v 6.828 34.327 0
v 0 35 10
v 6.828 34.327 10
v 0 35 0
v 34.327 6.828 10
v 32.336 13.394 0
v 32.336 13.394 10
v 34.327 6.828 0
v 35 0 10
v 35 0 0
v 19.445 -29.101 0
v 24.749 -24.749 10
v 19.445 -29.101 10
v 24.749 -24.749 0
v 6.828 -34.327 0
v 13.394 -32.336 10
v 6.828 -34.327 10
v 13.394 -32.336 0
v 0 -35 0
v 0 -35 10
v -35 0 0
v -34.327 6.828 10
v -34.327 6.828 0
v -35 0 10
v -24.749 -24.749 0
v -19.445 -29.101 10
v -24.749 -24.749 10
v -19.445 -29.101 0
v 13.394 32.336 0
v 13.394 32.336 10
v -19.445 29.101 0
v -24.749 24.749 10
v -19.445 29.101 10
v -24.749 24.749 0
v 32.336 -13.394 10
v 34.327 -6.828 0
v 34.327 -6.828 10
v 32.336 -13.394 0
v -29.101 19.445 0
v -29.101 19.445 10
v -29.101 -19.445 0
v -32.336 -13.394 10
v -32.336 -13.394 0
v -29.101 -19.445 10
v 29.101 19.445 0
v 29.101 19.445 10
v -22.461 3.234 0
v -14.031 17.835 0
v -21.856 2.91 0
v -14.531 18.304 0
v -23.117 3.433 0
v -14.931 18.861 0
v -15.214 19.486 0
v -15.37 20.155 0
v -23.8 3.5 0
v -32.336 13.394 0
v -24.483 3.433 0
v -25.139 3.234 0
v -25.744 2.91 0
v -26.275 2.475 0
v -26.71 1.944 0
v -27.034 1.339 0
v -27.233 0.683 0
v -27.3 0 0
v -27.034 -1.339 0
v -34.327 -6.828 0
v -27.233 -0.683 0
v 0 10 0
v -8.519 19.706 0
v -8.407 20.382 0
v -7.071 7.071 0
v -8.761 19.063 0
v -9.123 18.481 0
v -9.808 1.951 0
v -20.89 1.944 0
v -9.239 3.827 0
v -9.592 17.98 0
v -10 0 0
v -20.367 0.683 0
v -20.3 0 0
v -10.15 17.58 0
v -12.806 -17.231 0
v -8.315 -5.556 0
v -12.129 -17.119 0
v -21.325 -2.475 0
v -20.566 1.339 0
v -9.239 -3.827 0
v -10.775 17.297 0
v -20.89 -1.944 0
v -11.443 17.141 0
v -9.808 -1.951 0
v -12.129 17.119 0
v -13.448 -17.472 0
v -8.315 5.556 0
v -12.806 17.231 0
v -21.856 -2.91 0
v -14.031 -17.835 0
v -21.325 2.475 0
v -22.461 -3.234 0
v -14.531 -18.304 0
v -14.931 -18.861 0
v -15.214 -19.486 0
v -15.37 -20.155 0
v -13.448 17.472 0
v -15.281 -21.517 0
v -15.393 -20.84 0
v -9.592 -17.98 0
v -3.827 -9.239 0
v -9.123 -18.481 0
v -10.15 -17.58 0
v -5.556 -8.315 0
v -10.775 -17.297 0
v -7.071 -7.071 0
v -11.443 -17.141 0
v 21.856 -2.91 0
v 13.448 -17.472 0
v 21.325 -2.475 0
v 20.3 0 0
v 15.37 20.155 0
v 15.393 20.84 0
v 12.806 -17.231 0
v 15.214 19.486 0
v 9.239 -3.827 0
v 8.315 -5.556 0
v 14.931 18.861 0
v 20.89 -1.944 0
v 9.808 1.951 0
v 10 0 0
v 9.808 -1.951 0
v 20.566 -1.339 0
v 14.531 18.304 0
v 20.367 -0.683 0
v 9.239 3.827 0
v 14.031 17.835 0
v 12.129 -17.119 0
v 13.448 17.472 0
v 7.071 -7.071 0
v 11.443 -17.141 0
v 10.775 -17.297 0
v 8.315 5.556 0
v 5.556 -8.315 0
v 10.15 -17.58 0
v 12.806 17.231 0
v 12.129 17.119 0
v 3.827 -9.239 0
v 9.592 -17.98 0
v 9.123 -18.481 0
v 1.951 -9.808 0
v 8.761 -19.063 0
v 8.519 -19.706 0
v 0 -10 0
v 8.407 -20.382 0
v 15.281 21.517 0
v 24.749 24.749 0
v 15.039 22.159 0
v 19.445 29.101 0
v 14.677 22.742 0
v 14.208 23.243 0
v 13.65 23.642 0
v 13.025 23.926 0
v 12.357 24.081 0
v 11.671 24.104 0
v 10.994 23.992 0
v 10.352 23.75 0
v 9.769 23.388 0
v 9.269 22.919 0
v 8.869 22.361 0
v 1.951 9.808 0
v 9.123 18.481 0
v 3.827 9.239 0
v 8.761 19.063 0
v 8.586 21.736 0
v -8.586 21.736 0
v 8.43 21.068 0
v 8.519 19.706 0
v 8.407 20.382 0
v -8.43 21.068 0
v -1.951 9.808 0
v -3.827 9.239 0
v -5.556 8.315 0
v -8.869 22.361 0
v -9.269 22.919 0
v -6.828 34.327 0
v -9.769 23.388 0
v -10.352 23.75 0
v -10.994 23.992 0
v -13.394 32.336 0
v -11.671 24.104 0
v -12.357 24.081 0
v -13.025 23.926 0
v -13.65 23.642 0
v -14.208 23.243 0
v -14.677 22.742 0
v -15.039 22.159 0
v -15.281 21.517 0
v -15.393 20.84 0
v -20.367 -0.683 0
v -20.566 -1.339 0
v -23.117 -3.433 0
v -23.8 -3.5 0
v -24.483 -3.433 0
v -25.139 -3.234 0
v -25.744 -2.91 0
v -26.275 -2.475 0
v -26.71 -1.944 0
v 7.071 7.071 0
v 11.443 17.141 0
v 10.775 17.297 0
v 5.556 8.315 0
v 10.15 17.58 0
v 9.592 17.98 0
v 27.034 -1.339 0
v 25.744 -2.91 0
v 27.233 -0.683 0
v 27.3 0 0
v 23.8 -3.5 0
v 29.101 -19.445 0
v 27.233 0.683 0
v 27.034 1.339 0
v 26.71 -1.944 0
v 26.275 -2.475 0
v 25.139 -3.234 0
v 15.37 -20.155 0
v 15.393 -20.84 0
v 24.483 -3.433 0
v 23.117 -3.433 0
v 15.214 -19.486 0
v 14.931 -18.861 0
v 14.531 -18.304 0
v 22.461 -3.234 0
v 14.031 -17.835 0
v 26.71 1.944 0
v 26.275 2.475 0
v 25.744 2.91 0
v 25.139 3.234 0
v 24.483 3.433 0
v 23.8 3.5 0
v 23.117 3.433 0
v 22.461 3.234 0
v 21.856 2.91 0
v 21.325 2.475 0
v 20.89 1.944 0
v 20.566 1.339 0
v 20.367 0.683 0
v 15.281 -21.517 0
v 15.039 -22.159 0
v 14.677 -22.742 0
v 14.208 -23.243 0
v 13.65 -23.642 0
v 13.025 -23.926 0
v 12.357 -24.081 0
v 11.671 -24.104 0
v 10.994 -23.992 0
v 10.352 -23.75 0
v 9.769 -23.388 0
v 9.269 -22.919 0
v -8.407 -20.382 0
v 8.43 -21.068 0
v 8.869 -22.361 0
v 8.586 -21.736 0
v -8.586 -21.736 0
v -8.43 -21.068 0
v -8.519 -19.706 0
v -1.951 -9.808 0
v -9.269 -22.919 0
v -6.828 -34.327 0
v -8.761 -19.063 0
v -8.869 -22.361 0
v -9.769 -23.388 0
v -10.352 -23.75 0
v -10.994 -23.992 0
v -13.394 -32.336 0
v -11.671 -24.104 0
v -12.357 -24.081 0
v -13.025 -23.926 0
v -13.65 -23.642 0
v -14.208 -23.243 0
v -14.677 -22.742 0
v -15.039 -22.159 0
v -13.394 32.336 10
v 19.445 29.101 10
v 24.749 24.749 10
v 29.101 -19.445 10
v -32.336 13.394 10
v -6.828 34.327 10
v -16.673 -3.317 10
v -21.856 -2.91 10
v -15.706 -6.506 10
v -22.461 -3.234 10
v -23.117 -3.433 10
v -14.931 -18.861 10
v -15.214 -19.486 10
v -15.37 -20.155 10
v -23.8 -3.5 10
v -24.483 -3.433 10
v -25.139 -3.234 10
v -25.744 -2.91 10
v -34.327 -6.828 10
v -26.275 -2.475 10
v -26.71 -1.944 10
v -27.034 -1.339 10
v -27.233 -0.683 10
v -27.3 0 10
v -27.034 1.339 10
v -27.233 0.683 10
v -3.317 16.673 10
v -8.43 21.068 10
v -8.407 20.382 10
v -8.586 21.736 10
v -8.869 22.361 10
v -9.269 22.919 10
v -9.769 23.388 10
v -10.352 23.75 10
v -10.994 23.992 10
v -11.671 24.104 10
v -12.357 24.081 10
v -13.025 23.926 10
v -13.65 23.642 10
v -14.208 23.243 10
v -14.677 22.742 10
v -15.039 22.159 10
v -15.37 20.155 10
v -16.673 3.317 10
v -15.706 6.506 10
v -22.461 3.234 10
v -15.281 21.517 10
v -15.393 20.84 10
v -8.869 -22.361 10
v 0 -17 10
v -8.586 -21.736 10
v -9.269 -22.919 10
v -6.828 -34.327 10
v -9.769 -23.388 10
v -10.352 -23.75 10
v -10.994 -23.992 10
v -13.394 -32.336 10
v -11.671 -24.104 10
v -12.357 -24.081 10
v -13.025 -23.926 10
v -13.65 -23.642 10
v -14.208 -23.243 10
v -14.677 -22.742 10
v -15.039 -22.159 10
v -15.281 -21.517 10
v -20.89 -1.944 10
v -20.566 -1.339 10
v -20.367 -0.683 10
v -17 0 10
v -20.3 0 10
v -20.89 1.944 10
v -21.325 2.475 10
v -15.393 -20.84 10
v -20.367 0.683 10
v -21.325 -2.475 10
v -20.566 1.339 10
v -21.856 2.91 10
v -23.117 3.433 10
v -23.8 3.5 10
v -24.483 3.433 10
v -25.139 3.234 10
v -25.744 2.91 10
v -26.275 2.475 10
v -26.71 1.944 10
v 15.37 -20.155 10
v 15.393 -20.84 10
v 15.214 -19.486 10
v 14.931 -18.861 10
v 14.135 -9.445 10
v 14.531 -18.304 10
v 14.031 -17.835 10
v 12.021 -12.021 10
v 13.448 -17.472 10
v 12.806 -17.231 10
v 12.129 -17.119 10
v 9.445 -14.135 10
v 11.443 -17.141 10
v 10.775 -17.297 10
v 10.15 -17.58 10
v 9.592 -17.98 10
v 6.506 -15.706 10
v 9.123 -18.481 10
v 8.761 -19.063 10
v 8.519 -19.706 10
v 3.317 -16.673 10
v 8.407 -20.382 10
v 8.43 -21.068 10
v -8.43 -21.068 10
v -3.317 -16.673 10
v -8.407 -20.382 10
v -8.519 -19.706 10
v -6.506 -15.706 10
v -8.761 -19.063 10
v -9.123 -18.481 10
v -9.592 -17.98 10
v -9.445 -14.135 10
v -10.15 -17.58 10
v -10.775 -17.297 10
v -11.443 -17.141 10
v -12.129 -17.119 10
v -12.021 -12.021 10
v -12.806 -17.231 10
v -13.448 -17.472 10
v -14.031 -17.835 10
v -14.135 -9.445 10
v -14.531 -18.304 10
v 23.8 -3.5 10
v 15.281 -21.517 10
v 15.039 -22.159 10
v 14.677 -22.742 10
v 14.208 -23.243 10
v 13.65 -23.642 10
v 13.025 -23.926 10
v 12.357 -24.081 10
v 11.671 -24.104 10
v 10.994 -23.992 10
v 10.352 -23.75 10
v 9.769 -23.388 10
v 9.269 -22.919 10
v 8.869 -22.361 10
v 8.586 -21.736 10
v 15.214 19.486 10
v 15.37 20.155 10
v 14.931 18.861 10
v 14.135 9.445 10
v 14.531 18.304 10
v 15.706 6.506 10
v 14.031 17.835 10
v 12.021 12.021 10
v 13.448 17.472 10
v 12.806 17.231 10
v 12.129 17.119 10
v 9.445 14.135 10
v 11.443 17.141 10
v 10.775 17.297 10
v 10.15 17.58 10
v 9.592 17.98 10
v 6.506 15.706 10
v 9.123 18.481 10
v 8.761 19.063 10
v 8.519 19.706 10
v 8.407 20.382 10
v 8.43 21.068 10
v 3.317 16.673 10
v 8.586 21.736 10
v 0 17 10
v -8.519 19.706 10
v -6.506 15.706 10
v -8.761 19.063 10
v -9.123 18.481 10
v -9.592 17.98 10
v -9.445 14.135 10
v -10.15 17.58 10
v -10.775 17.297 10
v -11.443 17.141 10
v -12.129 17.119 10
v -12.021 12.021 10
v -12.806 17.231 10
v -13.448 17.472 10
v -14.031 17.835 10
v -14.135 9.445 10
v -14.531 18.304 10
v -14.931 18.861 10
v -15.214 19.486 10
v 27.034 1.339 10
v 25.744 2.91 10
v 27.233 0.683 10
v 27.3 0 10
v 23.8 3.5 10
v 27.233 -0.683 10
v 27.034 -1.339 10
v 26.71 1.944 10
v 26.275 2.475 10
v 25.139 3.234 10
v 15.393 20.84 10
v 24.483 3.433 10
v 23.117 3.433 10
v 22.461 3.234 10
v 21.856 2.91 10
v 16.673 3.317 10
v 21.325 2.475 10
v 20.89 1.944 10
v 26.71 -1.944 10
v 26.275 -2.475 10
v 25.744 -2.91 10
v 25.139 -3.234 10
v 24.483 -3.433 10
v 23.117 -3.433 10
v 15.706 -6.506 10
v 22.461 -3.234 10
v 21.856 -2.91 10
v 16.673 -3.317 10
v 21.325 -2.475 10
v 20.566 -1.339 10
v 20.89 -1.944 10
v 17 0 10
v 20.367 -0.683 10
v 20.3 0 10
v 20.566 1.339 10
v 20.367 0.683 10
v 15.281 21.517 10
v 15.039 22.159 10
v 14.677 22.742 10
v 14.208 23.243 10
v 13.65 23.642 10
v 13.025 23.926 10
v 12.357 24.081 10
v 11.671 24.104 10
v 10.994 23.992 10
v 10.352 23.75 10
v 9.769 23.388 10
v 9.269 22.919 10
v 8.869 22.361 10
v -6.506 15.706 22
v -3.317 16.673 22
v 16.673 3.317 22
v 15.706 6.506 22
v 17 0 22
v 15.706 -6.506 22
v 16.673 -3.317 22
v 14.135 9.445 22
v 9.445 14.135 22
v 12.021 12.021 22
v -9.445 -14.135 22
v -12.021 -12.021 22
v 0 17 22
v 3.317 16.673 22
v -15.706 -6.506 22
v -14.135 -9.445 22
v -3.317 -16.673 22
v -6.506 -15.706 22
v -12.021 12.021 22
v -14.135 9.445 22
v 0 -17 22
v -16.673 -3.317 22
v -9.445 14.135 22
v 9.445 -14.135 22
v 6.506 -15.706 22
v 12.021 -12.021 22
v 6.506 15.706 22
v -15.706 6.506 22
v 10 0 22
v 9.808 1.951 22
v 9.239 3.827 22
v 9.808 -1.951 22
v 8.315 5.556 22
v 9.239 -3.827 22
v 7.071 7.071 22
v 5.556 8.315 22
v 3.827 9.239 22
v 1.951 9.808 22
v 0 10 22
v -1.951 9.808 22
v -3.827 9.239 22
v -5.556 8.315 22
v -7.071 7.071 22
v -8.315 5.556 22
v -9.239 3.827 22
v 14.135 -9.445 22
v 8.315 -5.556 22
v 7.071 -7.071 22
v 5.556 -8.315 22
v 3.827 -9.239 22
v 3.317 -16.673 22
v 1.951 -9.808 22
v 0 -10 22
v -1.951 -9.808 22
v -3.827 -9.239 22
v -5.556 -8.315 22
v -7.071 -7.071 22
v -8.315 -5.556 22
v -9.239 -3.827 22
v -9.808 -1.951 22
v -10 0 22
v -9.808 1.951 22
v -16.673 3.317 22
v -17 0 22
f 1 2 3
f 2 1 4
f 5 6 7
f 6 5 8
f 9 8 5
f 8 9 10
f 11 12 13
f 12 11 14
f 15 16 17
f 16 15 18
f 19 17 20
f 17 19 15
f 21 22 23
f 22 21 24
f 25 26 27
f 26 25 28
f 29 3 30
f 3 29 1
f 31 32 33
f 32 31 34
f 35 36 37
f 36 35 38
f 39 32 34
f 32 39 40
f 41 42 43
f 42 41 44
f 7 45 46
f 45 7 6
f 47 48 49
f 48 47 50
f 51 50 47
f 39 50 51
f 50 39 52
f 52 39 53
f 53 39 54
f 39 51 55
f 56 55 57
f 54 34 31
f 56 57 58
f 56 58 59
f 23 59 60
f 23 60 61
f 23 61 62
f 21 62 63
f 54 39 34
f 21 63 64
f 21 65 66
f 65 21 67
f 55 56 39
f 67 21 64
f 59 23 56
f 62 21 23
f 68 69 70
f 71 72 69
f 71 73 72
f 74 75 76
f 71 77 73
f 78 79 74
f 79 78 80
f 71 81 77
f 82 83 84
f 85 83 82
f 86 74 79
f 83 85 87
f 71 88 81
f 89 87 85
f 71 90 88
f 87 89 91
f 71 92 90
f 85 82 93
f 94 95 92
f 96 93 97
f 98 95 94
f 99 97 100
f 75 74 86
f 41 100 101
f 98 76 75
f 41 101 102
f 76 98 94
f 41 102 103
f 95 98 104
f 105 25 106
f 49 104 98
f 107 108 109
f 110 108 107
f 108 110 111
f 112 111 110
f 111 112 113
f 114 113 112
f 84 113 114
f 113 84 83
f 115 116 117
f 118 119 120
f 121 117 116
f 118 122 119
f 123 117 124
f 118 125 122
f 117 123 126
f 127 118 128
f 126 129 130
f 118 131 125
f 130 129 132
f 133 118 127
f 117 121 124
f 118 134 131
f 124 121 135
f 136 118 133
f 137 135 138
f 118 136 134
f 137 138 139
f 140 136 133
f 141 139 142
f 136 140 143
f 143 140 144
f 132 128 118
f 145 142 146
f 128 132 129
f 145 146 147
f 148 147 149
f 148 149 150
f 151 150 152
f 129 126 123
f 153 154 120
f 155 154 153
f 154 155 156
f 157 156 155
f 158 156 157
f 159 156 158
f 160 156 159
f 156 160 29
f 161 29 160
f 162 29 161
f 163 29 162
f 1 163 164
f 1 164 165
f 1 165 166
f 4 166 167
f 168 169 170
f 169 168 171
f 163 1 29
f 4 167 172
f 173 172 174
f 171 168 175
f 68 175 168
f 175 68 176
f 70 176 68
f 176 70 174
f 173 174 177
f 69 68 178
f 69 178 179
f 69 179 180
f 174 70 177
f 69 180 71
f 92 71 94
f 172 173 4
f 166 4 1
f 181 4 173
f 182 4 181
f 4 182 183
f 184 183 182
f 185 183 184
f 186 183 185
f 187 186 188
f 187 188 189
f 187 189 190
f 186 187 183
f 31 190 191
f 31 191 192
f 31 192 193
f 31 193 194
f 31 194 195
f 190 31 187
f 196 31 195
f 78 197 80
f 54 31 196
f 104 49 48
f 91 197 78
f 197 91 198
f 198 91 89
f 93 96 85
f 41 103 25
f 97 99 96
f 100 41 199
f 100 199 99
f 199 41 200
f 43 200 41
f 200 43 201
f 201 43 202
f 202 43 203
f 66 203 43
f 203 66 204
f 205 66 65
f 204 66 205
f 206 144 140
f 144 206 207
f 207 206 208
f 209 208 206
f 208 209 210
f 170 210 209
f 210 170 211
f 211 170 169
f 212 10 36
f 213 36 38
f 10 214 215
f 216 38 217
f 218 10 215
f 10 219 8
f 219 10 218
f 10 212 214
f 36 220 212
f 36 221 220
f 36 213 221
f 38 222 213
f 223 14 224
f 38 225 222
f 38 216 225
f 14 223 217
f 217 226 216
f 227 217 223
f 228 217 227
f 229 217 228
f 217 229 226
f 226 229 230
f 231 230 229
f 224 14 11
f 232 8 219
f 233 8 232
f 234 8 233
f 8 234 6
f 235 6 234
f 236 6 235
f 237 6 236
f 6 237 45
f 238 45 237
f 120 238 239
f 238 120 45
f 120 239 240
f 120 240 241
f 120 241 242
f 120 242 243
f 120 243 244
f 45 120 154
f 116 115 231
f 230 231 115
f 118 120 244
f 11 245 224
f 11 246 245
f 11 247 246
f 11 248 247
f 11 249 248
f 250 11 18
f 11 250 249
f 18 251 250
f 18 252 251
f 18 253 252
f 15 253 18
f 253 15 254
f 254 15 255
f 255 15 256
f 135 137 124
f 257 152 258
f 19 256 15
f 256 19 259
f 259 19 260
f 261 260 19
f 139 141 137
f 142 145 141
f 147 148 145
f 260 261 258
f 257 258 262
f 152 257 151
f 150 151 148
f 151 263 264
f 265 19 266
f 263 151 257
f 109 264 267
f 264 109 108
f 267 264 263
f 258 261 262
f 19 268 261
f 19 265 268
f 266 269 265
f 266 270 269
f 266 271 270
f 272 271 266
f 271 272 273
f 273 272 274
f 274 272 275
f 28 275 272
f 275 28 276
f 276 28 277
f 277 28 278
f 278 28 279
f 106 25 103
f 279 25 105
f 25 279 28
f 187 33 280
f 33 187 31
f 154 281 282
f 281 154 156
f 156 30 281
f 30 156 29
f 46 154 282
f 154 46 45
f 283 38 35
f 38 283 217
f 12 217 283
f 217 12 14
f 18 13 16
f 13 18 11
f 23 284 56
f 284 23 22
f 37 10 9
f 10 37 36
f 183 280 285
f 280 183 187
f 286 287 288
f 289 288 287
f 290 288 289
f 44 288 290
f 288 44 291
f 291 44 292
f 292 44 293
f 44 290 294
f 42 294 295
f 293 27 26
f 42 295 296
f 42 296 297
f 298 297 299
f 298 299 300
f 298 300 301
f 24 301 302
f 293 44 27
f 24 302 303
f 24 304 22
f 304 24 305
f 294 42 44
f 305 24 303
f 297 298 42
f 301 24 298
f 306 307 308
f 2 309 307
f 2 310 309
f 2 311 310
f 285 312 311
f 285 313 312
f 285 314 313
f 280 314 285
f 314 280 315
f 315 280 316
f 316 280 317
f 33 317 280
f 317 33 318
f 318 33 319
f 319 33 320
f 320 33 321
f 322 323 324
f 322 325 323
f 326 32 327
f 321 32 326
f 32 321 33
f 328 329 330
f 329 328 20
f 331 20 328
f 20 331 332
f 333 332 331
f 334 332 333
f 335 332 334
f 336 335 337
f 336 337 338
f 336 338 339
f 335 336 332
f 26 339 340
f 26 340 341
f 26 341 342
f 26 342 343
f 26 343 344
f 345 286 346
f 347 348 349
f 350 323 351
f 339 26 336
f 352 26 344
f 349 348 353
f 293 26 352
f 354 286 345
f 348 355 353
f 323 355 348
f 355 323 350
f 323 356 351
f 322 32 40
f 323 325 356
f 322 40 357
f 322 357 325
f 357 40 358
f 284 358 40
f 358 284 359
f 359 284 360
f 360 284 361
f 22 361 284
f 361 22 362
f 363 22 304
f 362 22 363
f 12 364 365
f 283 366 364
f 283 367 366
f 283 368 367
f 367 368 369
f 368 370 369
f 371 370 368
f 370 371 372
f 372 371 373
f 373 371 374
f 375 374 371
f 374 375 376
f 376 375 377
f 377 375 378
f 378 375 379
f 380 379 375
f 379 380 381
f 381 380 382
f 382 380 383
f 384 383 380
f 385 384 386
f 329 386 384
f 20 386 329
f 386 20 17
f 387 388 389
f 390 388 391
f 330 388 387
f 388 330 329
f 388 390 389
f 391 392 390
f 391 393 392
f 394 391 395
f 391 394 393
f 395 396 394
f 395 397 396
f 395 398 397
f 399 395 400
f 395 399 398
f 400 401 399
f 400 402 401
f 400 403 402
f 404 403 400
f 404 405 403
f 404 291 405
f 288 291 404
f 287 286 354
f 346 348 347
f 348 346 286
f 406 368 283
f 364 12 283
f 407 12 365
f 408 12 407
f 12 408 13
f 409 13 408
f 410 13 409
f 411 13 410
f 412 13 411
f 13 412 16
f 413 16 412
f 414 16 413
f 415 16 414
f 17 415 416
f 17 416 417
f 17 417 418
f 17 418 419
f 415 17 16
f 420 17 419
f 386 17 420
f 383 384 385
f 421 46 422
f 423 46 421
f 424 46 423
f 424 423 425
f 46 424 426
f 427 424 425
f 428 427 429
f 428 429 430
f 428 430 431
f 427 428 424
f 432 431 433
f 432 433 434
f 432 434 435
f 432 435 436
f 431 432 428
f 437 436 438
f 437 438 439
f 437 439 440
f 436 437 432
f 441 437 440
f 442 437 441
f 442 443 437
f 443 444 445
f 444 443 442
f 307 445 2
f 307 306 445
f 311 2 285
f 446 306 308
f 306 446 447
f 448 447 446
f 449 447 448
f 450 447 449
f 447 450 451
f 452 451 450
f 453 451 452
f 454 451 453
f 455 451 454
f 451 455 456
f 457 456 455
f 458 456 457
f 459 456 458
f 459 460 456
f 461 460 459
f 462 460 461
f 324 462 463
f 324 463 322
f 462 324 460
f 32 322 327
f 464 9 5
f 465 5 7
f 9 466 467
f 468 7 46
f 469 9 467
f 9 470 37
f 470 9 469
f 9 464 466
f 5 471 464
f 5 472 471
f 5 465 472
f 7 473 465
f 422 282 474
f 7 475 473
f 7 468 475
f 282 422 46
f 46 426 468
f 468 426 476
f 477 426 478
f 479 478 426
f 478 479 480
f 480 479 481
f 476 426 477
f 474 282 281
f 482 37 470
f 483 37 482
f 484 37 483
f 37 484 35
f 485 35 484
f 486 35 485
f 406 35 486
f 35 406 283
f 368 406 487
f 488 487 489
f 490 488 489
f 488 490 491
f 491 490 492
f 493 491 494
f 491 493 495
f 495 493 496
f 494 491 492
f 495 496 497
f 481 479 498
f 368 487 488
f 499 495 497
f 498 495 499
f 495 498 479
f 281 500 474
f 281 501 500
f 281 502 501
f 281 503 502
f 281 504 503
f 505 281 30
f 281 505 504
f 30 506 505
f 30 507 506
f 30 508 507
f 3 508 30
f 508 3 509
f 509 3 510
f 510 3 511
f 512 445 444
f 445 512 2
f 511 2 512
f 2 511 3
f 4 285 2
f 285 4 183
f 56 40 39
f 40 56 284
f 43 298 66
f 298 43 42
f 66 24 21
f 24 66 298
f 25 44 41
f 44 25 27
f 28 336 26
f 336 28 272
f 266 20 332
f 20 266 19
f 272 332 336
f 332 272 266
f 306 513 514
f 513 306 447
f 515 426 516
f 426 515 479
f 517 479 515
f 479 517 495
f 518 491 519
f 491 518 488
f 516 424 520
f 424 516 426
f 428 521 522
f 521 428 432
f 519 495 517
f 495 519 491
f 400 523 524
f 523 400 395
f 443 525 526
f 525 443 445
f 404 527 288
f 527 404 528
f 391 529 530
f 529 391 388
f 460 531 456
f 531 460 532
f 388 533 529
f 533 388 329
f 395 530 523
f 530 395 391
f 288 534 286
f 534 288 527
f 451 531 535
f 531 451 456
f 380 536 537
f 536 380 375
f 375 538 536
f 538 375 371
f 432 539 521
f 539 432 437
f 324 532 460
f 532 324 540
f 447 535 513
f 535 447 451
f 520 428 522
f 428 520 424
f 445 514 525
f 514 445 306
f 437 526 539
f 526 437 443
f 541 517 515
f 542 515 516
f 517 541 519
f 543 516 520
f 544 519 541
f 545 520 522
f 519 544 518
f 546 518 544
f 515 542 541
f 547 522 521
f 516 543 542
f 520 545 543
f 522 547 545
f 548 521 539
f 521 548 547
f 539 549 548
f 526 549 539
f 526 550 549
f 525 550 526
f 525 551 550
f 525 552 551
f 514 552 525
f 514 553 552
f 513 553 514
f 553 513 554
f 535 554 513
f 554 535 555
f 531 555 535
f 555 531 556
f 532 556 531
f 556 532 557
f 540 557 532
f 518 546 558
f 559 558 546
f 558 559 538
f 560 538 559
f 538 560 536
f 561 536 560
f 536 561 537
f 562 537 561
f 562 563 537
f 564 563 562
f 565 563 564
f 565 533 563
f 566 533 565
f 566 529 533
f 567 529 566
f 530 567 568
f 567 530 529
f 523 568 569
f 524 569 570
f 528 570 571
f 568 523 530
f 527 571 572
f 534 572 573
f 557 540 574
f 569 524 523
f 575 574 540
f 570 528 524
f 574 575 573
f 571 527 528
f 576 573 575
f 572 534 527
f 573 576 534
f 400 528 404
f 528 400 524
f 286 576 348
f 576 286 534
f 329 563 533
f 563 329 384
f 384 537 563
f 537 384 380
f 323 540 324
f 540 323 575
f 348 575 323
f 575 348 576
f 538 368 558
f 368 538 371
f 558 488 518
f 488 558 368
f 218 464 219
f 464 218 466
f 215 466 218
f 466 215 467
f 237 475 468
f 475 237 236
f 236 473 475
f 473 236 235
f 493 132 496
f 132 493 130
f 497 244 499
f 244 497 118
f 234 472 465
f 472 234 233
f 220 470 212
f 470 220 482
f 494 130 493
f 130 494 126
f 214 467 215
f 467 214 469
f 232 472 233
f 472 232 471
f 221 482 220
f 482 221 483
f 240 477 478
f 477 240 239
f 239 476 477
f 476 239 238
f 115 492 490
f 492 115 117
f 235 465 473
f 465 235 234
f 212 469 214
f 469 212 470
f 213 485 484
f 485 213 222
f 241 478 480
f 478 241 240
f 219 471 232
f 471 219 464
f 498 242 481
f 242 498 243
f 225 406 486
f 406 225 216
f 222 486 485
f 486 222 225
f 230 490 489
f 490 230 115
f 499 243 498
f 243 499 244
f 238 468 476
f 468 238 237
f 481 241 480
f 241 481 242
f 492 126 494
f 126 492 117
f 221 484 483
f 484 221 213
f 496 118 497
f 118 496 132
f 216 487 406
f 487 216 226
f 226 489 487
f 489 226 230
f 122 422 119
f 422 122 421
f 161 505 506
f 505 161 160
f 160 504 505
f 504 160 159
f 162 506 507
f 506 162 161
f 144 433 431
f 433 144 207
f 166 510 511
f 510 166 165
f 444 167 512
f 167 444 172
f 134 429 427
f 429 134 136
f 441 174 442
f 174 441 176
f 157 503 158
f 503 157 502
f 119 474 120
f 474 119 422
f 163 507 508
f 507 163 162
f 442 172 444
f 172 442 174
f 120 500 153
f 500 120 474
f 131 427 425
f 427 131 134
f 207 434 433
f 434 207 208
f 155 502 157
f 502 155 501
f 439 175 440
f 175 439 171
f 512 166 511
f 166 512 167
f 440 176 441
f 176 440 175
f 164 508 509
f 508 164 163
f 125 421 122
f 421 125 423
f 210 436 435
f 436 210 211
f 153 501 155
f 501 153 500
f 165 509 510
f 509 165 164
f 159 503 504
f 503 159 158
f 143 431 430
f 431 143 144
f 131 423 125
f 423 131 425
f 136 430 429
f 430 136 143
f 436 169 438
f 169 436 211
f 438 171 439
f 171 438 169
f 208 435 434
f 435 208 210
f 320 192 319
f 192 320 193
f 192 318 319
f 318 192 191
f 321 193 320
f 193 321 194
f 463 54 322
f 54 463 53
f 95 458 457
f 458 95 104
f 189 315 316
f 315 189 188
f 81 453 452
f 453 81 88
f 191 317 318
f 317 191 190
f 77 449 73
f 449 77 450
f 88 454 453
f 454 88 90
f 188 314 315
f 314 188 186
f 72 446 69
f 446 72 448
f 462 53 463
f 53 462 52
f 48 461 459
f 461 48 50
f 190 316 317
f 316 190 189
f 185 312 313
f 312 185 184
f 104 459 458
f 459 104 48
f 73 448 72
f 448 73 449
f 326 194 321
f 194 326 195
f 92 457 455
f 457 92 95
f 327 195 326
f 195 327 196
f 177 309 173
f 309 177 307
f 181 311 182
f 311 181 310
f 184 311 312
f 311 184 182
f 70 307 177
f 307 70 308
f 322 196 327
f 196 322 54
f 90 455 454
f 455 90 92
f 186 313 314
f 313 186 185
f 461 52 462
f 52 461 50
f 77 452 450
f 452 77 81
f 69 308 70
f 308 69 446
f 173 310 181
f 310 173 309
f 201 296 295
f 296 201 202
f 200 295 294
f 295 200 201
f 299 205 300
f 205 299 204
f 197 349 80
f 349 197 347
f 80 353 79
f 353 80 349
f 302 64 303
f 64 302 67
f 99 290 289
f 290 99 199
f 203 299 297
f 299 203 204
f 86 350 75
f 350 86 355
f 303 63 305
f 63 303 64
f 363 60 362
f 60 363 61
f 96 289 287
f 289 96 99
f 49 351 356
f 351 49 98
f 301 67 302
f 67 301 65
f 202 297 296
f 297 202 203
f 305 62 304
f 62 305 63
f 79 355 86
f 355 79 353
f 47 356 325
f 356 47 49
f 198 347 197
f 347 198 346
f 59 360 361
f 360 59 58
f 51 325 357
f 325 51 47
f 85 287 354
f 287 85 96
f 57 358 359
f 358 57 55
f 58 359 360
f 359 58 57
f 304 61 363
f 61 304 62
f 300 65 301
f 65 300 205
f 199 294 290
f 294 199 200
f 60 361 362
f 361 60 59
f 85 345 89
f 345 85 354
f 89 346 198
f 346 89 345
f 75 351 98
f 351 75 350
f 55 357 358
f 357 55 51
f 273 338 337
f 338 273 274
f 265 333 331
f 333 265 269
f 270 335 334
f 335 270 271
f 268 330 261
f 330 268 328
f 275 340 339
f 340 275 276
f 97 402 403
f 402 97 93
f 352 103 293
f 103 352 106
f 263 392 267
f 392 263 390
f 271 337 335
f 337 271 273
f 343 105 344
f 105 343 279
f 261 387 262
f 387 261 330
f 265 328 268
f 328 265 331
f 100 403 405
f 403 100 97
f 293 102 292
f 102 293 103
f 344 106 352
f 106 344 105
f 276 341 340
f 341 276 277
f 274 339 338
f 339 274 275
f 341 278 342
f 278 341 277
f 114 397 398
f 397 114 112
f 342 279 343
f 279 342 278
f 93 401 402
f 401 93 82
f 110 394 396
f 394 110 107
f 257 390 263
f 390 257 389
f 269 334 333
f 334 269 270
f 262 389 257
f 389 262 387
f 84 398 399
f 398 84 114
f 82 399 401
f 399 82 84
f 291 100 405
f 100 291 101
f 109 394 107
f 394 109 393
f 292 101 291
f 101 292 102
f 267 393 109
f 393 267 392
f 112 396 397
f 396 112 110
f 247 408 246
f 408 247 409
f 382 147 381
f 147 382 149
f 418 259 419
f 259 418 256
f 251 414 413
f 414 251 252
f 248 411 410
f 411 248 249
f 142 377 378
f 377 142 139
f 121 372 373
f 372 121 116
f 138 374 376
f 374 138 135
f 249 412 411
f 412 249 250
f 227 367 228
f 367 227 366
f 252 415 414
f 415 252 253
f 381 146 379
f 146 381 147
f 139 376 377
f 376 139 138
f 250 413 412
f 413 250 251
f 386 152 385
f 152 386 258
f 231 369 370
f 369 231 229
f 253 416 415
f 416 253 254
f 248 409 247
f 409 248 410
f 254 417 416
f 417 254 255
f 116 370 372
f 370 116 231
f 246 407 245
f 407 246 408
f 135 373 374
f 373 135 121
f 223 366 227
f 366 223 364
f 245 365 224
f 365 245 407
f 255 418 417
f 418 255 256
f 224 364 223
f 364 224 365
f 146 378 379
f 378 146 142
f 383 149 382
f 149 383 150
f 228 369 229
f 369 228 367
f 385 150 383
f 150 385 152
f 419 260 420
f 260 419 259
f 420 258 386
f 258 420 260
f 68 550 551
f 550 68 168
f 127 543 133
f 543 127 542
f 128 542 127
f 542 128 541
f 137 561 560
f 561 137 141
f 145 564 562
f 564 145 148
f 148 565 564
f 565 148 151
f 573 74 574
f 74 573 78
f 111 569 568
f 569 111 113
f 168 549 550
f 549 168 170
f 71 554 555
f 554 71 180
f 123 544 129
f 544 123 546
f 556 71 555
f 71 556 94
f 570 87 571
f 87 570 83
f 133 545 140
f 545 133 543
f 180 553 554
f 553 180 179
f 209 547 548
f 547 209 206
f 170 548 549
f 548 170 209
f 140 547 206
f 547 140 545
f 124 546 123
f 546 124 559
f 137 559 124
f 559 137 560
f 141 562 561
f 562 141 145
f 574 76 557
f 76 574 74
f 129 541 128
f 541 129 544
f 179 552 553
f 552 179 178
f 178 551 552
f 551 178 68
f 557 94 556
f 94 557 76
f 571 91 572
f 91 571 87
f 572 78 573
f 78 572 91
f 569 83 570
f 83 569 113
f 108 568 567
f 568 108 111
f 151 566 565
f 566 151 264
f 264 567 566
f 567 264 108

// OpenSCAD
$fn = 32;

// ----------------------------------------------------------------------
// Bolt-circle flange: 70 mm outside, 6 bolt holes, bore 20 mm
// ----------------------------------------------------------------------

// --- parameters (mm) ---
flange_d = 70;            // flange outside diameter
flange_t = 10;            // flange thickness
bolts = 6;                // number of bolt holes
bolt_d = 7;               // bolt clearance
bolt_r = 23.8;            // bolt circle radius
bore_d = 20;              // centre bore
hub_d = 34;               // raised hub diameter
hub_h = 12;               // raised hub height

module body() {
  cylinder(h = flange_t, d = flange_d);
  /* raised hub, sunk 1 mm into the flange */
  translate([0, 0, flange_t - 1]) cylinder(h = hub_h + 1, d = hub_d);
}

difference() {
  body();
  /* bolt circle */
  for (i = [0 : bolts - 1]) rotate([0, 0, i * 360 / bolts]) translate([bolt_r, 0, -1]) cylinder(h = flange_t + hub_h + 3, d = bolt_d);
  translate([0, 0, -1]) cylinder(h = flange_t + hub_h + 3, d = bore_d);
}
